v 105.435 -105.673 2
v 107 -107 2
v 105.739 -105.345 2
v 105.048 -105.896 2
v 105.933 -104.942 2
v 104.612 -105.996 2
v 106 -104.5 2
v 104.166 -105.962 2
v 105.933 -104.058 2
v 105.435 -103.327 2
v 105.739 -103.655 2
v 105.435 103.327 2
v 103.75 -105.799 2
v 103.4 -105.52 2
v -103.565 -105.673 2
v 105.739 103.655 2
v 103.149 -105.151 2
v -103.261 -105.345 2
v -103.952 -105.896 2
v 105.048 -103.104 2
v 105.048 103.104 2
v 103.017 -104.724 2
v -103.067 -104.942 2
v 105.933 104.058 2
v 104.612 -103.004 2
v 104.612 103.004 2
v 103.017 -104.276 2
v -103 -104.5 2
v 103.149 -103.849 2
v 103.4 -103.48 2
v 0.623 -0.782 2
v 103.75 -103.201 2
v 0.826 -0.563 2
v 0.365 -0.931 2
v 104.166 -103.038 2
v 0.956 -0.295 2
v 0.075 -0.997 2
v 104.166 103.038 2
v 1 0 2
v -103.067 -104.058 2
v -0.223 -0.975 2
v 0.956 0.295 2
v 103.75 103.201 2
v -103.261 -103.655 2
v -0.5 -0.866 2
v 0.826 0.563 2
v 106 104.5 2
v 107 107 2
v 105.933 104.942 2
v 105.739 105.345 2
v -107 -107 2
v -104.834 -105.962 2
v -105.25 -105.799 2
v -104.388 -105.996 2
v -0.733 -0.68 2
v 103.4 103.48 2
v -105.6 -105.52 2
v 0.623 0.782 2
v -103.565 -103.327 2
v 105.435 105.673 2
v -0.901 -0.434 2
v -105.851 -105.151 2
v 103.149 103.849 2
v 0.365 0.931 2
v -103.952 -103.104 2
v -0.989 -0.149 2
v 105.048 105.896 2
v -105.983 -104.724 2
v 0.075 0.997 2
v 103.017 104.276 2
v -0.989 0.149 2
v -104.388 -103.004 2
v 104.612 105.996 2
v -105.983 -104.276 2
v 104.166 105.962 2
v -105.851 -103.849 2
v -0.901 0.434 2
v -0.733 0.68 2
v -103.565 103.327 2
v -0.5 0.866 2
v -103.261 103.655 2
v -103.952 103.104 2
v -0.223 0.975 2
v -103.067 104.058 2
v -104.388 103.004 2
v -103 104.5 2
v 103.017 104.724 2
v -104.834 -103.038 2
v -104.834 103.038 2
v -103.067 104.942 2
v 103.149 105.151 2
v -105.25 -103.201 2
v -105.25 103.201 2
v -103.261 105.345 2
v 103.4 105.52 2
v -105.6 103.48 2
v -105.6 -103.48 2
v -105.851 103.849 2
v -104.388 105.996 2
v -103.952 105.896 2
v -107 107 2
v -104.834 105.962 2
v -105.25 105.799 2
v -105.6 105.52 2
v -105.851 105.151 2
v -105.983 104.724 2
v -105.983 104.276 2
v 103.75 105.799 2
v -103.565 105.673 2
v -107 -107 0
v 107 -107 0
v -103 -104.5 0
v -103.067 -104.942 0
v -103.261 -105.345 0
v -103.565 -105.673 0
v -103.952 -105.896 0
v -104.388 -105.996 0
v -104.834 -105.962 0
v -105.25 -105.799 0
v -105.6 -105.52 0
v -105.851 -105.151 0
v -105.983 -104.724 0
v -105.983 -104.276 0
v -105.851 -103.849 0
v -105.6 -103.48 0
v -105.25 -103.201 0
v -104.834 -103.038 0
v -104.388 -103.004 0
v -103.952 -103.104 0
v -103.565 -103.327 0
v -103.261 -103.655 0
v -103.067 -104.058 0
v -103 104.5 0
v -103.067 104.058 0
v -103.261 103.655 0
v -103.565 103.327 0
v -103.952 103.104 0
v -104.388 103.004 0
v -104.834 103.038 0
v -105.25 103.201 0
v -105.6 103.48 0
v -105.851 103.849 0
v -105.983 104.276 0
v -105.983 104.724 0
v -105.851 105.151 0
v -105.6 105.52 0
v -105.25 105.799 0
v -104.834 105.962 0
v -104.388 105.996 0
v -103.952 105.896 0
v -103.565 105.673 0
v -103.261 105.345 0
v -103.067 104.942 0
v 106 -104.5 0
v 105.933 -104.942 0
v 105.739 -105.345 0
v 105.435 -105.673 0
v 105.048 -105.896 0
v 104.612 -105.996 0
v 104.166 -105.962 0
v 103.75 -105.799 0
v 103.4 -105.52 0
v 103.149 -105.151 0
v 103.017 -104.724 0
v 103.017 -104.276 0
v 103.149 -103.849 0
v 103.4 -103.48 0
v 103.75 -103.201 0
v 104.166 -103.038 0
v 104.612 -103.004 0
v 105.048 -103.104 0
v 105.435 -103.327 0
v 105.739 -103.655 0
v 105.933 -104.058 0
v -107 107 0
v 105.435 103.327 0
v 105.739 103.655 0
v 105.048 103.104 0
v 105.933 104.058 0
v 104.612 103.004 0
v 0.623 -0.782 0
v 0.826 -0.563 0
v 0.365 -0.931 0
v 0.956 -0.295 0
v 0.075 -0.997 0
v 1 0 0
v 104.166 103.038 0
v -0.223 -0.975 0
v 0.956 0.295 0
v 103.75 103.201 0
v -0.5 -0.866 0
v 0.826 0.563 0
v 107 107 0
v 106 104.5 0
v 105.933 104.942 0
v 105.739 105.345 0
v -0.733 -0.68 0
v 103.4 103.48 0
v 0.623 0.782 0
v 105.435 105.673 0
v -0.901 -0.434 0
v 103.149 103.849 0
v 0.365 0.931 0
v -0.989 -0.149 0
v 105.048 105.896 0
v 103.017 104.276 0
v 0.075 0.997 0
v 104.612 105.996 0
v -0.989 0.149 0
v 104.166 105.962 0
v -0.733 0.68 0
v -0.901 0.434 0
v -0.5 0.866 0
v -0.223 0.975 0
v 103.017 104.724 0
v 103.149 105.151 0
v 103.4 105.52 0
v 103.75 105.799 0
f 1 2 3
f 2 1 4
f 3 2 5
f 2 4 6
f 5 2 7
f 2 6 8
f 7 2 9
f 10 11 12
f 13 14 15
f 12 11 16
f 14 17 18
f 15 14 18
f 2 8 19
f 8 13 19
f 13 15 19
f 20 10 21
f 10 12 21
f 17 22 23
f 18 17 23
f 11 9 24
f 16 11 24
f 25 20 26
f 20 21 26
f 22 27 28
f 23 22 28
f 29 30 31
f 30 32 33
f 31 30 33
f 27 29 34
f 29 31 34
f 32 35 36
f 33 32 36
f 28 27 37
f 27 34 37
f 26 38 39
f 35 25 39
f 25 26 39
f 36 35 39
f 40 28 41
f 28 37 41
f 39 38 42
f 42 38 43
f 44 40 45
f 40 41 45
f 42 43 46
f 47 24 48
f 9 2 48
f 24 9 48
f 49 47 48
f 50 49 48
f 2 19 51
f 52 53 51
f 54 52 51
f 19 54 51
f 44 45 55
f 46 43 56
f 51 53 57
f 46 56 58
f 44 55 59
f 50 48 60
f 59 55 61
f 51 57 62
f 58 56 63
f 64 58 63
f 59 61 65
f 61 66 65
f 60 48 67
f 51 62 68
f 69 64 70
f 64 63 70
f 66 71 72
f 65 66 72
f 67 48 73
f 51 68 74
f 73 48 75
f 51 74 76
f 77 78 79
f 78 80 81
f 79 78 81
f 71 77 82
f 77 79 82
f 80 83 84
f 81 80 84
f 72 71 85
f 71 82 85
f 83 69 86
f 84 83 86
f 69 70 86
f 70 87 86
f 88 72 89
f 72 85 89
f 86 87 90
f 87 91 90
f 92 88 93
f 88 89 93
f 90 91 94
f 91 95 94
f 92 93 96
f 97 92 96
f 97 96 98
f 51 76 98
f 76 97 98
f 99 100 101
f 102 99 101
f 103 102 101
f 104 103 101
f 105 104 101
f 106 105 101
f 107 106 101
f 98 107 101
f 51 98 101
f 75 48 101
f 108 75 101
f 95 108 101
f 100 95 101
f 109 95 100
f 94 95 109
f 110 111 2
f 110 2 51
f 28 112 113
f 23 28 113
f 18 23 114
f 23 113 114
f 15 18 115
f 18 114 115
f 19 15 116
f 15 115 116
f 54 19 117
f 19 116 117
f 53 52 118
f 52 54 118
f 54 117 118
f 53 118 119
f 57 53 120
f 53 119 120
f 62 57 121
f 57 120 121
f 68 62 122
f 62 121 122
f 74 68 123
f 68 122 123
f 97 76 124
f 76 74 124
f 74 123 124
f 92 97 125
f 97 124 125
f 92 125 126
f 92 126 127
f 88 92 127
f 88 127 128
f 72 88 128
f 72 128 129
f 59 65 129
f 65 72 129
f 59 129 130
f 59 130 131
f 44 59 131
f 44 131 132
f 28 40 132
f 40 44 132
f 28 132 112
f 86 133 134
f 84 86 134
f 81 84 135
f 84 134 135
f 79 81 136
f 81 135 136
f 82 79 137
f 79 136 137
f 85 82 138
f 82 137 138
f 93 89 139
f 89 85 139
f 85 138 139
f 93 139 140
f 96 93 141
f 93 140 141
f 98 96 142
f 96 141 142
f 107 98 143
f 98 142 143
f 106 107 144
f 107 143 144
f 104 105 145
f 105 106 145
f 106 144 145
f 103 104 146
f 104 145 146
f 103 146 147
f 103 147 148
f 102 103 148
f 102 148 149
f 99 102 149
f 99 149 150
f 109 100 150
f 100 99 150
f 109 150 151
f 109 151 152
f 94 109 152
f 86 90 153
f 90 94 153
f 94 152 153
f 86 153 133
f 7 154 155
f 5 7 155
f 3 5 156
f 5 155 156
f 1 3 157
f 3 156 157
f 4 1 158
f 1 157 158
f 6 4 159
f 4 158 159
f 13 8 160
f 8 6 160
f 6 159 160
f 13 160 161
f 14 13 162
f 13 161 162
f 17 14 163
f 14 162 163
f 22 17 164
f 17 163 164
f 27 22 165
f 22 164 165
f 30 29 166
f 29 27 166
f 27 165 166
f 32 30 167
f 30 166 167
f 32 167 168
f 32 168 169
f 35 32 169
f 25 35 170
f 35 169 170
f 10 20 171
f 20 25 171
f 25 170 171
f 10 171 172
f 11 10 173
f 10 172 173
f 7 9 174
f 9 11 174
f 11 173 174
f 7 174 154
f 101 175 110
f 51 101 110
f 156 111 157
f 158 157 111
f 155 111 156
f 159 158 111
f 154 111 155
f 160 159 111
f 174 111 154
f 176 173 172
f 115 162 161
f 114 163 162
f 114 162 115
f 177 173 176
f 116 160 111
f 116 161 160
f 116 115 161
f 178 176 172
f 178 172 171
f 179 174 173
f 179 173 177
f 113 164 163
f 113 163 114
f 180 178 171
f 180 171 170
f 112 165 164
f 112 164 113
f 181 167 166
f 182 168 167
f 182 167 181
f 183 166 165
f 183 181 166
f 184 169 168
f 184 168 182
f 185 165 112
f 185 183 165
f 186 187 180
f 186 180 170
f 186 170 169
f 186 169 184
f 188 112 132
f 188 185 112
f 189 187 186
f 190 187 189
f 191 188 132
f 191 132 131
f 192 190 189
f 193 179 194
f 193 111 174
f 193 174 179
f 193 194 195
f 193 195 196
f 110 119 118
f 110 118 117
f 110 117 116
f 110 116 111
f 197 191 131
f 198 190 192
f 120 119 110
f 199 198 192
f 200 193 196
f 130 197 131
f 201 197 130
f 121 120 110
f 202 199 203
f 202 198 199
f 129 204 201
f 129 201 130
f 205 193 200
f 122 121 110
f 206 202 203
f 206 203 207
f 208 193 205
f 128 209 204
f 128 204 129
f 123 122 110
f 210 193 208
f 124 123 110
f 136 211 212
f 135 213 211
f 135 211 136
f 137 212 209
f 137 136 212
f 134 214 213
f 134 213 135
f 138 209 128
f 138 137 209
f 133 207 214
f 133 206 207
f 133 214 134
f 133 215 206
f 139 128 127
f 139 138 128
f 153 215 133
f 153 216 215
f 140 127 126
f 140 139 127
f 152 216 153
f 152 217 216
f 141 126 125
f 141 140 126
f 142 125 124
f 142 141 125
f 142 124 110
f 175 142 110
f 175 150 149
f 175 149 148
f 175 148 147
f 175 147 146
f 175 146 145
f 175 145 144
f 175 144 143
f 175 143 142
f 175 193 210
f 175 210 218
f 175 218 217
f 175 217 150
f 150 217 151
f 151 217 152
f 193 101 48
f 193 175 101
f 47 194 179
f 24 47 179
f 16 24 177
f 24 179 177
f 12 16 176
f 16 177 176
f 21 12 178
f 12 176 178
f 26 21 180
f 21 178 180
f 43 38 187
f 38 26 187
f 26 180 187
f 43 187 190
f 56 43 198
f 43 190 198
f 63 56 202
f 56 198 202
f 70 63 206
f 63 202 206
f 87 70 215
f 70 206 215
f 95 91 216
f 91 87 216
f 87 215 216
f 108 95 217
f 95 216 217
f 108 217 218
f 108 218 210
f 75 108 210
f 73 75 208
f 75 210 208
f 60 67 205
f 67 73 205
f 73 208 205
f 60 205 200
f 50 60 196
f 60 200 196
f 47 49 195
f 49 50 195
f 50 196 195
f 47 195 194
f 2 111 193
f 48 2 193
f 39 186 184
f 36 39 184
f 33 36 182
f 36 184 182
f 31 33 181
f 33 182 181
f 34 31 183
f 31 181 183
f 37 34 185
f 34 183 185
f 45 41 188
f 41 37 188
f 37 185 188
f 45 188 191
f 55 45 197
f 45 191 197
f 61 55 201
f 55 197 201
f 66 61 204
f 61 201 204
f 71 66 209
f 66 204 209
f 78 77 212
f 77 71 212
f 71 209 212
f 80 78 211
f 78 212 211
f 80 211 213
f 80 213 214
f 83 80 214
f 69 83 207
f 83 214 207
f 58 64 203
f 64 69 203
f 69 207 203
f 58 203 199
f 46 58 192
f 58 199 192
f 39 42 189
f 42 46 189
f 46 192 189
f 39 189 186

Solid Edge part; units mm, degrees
sketch "Sketch1" plane through (0, 0, 0) normal (0, 0, 1) x (1, 0, 0)
  circle A0 centre (-104.5, 104.5) radius 1.5
  circle A1 centre (-104.5, -104.5) radius 1.5
  circle A2 centre (104.5, 104.5) radius 1.5
  circle A3 centre (104.5, -104.5) radius 1.5
  circle A4 centre (0, 0) radius 1
  line L0 (-107, 107) -> (107, 107)
  line L1 (107, -107) -> (107, 107)
  line L2 (107, -107) -> (-107, -107)
  line L3 (-107, 107) -> (-107, -107)
  dimension "D1" = 214
  dimension "D2" = 214
  dimension "D3" = 107
  dimension "D4" = 107
  dimension "D5" = 107
  dimension "D6" = 107
  dimension "D7" = 214
  dimension "D8" = 209
  dimension "D9" = 2.5
  dimension "D10" = 2.5
  dimension "D11" = 209
  dimension "D12" = 2.5
  dimension "D13" = 3
  dimension "D14" = 2.5
  dimension "D15" = 2.5
  dimension "D16" = 2.5
extrude "Protrusion1" add sketch "Sketch1" along normal blind 2
